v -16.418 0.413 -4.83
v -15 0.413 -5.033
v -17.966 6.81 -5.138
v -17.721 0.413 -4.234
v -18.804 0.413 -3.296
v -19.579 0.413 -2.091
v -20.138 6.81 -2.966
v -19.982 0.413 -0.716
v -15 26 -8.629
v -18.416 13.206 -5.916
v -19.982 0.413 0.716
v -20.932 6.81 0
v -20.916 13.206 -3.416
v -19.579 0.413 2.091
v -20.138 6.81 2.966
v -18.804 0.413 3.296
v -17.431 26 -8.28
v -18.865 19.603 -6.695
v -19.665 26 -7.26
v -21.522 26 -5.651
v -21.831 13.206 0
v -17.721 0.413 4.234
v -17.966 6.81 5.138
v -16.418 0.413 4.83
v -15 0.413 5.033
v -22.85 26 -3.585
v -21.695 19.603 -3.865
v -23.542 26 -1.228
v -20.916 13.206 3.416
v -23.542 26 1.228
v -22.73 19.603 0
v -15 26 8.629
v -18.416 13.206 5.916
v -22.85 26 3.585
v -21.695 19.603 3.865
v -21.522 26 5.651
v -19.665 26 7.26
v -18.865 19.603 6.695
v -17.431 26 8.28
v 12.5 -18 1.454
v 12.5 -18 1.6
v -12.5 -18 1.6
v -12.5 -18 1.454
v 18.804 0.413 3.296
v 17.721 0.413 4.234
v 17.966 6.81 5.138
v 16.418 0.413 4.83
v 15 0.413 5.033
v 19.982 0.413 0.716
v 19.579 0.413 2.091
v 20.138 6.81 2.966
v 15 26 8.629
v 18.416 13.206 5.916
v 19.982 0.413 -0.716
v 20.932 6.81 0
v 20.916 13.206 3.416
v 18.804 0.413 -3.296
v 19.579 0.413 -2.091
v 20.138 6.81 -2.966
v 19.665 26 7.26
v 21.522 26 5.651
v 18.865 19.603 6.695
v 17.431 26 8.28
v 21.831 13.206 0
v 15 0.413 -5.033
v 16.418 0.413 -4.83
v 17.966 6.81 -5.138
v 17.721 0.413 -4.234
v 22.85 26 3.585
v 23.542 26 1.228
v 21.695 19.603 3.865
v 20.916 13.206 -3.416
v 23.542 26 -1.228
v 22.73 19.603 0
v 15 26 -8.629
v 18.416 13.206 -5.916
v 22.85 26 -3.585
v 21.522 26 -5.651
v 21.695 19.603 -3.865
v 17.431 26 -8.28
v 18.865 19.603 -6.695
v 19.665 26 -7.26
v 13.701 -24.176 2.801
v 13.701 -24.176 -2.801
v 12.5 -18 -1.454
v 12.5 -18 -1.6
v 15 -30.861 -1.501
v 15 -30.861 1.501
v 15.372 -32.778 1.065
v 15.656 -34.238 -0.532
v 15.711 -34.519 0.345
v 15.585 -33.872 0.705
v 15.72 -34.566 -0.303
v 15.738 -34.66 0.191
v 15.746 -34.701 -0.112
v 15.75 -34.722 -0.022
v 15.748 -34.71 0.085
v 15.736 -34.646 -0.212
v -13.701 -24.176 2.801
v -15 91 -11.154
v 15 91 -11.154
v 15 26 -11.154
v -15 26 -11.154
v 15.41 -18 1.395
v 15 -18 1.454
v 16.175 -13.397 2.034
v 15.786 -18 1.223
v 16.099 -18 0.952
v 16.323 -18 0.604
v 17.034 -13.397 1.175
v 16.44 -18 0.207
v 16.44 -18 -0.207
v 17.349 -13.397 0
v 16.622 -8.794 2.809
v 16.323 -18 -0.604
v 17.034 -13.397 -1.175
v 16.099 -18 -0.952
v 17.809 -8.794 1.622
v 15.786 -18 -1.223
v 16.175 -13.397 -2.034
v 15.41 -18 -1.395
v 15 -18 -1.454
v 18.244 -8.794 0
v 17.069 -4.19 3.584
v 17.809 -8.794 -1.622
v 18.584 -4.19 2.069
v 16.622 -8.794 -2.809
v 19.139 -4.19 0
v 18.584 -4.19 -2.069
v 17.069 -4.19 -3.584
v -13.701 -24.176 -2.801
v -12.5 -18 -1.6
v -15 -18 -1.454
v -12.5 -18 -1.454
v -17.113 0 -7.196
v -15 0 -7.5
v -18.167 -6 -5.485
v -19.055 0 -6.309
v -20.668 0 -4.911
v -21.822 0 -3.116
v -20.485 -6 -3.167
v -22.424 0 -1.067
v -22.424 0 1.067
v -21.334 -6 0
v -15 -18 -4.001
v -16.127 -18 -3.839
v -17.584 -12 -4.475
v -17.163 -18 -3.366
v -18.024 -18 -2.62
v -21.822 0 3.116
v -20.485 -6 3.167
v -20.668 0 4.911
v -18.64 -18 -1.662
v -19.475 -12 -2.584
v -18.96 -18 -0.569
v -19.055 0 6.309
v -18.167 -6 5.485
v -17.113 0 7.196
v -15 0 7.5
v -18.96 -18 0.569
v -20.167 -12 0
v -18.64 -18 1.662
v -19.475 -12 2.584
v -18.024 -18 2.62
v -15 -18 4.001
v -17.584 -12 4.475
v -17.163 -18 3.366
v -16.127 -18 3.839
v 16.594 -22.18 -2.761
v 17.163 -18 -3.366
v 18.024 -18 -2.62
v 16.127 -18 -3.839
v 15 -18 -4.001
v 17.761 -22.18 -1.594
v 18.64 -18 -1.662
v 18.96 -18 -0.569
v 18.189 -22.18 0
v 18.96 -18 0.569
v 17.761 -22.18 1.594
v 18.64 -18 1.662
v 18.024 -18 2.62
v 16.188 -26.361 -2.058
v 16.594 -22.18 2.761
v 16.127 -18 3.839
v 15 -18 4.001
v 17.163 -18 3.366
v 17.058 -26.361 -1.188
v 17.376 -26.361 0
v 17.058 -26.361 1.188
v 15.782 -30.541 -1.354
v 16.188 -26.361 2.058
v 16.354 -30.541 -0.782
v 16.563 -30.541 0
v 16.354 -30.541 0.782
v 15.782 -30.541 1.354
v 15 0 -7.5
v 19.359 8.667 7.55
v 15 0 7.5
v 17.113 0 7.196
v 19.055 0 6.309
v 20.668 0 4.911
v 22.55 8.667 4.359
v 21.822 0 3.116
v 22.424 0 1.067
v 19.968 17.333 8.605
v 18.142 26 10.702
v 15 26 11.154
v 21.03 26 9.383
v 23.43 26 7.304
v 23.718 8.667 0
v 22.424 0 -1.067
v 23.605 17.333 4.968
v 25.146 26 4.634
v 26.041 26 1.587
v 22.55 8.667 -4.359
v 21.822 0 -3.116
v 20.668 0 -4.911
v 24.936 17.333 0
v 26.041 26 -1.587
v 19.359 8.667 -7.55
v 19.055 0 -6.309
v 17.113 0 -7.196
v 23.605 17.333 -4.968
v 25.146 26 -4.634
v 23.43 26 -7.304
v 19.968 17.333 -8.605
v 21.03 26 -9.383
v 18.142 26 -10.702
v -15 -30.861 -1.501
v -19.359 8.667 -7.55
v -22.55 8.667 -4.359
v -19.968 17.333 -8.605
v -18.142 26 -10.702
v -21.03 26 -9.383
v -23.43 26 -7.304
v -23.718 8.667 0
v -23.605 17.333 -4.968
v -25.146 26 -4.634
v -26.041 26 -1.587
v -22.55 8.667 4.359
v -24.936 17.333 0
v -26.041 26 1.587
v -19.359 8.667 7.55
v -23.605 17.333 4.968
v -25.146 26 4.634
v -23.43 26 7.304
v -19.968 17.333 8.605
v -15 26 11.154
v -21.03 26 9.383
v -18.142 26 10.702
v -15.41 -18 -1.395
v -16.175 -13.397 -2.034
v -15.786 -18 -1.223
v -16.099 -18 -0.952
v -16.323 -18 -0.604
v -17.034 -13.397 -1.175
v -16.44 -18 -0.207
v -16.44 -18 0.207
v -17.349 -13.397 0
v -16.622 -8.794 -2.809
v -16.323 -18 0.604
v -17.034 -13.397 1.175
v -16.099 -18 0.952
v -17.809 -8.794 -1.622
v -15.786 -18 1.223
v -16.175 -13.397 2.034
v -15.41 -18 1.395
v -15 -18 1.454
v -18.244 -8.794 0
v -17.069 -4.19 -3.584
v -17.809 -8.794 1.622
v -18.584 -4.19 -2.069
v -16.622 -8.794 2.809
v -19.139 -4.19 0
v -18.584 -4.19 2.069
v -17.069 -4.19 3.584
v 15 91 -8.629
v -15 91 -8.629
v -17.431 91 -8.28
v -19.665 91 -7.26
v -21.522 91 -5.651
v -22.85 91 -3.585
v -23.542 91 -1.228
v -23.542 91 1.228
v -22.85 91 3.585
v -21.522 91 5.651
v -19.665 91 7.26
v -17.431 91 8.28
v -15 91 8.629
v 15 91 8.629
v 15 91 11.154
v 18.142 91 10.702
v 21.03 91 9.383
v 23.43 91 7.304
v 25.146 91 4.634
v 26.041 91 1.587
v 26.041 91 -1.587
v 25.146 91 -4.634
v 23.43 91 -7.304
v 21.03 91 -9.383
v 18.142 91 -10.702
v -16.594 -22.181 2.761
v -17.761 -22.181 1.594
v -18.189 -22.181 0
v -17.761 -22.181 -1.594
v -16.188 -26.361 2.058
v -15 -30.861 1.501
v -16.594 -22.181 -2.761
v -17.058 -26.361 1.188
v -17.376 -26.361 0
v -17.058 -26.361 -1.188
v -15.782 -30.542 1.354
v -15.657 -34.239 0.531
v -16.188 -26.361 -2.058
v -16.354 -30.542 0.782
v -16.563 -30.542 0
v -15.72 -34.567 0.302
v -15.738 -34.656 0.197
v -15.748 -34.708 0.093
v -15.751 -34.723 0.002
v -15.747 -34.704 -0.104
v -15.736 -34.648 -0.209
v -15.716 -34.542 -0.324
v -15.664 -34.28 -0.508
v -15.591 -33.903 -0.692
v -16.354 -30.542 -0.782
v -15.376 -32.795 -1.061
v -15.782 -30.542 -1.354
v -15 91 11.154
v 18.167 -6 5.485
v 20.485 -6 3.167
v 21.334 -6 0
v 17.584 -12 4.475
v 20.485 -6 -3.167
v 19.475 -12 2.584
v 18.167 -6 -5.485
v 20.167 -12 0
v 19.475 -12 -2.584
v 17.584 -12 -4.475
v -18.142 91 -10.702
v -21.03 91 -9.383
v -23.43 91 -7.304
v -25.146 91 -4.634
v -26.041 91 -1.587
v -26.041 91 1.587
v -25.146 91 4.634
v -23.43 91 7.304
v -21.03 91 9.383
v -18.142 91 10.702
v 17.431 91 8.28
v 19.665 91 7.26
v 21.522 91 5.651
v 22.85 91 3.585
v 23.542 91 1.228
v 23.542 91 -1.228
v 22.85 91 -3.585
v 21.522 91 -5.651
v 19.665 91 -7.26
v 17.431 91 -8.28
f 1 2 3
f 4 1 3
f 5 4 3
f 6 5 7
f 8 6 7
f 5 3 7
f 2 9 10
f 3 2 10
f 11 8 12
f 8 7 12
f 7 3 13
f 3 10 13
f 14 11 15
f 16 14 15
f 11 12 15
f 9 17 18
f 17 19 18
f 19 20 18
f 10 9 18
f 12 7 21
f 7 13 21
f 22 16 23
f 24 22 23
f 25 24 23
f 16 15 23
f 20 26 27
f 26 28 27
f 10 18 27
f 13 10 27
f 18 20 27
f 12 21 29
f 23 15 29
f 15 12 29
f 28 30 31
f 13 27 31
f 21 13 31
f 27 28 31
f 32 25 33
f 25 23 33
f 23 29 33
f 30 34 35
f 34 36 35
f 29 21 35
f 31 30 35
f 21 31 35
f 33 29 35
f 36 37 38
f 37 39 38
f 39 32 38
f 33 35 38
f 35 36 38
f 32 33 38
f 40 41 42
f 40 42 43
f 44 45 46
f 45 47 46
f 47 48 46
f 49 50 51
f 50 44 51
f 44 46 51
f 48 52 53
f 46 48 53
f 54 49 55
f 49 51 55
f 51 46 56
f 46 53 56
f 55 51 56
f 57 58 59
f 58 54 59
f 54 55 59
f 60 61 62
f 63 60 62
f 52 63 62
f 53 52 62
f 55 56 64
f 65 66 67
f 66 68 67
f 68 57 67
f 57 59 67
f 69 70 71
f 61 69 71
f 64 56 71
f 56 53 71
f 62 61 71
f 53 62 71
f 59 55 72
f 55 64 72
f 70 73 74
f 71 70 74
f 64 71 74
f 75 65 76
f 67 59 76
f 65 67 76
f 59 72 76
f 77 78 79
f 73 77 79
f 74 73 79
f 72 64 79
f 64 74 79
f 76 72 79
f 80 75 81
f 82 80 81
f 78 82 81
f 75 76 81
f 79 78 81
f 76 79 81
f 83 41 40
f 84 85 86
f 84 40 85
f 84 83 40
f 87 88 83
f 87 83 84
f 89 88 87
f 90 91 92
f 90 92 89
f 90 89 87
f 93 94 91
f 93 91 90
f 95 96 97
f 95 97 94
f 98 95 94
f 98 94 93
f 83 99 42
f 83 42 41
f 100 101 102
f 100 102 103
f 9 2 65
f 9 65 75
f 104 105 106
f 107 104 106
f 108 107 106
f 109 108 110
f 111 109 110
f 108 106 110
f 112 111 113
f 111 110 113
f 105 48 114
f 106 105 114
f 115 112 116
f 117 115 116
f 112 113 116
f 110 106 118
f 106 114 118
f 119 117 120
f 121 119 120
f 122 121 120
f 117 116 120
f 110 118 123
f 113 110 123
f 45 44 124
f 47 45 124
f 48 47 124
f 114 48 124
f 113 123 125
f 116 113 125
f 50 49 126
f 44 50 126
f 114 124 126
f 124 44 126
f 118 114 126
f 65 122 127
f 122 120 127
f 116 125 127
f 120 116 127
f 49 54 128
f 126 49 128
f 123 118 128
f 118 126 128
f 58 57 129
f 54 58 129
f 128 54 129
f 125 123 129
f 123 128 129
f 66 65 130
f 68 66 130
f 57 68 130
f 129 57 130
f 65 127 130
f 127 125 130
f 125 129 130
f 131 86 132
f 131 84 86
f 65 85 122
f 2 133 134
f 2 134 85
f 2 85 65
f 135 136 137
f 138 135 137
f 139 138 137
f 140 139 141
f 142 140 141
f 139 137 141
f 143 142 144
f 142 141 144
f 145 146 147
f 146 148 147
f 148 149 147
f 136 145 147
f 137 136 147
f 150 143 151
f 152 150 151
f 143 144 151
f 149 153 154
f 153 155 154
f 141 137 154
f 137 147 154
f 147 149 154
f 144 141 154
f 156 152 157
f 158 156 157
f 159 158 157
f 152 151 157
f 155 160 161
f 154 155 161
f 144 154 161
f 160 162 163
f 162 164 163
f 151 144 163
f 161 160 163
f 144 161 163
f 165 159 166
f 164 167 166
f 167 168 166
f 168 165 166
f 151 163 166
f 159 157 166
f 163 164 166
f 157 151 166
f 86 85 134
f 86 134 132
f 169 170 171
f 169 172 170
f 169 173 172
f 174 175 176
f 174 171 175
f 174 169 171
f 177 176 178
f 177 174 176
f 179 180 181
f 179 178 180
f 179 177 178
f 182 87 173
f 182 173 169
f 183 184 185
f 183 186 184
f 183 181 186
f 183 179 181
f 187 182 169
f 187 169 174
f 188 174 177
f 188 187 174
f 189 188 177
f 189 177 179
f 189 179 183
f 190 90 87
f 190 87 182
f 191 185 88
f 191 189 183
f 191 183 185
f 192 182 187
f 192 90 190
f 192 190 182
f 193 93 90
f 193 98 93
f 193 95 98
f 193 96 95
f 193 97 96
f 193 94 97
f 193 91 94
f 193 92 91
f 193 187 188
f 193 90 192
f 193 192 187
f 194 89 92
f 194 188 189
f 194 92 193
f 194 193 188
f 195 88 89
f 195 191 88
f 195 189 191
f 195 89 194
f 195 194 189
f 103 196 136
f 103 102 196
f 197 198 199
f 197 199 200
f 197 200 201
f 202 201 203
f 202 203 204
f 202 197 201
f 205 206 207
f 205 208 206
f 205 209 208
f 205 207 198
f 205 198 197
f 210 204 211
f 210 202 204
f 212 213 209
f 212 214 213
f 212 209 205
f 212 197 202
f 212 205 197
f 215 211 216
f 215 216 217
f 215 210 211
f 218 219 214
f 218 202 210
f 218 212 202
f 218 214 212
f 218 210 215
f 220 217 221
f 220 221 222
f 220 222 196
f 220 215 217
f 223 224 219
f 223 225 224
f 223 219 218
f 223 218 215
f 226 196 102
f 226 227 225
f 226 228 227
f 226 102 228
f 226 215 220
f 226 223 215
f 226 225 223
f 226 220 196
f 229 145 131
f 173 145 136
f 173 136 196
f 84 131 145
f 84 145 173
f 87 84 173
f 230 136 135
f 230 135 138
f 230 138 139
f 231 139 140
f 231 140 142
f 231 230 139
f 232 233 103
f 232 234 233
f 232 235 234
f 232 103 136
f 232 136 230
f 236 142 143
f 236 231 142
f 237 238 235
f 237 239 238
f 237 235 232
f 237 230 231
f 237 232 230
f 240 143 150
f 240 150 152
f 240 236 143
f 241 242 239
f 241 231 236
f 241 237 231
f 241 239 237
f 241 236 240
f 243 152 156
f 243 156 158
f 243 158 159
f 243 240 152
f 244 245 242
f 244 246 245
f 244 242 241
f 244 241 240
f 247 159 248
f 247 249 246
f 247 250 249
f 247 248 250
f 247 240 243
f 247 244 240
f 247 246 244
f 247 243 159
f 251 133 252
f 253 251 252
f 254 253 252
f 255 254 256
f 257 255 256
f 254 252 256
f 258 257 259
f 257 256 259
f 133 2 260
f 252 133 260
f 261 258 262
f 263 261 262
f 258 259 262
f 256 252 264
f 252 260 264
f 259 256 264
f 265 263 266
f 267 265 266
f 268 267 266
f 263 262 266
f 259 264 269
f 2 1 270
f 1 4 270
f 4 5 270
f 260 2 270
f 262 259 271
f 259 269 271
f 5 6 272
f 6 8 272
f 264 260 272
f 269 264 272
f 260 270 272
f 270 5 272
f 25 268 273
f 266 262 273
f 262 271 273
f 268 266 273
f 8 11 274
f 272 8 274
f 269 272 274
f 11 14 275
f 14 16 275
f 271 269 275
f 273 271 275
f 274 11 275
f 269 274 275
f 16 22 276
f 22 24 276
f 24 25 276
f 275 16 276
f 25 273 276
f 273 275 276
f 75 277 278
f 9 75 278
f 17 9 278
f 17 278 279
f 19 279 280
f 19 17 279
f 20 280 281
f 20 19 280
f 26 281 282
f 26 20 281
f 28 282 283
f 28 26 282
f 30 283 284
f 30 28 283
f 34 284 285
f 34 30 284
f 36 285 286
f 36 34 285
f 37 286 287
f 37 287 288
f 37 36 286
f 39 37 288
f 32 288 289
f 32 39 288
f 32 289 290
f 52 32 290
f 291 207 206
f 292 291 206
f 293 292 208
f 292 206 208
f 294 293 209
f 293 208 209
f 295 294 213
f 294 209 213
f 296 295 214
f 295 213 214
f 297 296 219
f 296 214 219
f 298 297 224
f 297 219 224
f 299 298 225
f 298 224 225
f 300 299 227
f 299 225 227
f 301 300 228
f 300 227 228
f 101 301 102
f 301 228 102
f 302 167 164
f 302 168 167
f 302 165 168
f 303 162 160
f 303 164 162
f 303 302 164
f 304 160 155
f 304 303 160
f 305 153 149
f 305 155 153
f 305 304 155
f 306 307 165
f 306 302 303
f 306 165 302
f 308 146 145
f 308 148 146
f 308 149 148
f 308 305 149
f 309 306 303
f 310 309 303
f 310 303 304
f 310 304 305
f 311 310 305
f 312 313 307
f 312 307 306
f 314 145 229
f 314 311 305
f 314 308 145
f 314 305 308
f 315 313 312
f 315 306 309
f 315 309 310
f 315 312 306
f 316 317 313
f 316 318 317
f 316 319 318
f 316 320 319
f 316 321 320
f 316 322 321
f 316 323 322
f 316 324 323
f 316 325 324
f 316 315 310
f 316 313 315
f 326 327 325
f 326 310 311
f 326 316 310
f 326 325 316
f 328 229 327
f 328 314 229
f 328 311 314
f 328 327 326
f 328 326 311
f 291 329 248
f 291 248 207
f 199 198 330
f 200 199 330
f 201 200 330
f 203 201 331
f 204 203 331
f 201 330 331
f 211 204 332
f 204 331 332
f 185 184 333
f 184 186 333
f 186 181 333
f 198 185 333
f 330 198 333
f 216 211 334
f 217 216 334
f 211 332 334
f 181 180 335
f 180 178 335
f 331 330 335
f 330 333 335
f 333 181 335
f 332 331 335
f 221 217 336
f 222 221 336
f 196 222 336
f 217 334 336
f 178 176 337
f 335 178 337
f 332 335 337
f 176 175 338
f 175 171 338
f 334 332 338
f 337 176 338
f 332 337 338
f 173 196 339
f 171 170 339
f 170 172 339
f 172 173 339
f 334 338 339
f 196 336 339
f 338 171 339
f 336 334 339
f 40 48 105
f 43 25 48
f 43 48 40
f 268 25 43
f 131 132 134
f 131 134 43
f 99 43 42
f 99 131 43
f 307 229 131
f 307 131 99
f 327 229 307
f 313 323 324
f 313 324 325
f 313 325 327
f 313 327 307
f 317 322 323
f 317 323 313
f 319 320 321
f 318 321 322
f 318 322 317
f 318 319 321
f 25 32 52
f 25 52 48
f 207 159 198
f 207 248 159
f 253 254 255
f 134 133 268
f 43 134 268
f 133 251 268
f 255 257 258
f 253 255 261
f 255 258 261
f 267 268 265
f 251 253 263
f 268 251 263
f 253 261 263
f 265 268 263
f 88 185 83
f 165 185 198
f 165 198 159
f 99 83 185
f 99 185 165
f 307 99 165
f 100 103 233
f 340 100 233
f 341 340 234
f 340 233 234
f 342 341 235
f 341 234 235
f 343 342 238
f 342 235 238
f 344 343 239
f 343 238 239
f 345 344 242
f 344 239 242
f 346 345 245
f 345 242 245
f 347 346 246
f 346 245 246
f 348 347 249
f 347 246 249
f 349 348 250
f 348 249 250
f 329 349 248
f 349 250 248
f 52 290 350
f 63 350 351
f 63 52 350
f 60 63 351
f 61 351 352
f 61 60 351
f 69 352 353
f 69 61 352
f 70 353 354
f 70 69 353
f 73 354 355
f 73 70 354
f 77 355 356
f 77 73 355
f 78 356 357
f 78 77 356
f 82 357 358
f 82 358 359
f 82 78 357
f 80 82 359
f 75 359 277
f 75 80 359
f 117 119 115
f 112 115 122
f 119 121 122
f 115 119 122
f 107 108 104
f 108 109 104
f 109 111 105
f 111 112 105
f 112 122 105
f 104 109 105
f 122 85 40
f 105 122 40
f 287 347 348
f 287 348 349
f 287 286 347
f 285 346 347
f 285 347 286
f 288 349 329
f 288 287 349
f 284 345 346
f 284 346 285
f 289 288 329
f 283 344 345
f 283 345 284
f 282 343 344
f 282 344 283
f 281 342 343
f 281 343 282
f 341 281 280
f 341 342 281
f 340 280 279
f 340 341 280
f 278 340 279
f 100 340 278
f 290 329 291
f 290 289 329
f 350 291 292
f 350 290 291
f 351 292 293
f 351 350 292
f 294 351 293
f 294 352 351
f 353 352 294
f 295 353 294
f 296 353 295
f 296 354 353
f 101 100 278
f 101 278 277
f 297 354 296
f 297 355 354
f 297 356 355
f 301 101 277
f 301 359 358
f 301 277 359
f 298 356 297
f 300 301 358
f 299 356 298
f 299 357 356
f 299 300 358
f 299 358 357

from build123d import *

# Parameters (mm, degrees)
BOSS_EXTRUDE1_DEPTH           = 18
BOSS_EXTRUDE1_TAPER           = 11
BOSS_EXTRUDE1_OTHER_WAY_DEPTH = 26
BOSS_EXTRUDE1_OTHER_WAY_TAPER = -8
SHELL1_START                  = -15
SHELL1_DEPTH                  = 30
SKETCH2_W                     = 25
SKETCH2_H                     = 3.2
BOSS_EXTRUDE2_DEPTH           = 20
BOSS_EXTRUDE2_TAPER           = 11
BOSS_EXTRUDE3_DEPTH           = 65


with BuildPart() as part:
    # Sketch1 → Boss-Extrude1 (new body)
    with BuildSketch(Plane(origin=(0, 0, 0), x_dir=(1, 0, 0), z_dir=(0, 1, 0))):
        with BuildLine():
            ThreePointArc((-15, 7.5), (-22.5, 0), (-15, -7.5))
            Line((-15, -7.5), (15, -7.5))
            ThreePointArc((15, -7.5), (22.5, 0), (15, 7.5))
            Line((15, 7.5), (-15, 7.5))
        make_face()
    extrude(amount=-BOSS_EXTRUDE1_DEPTH, taper=BOSS_EXTRUDE1_TAPER)

    # Sketch1 → Boss-Extrude1 other way (add)
    with BuildSketch(Plane(origin=(0, 0, 0), x_dir=(1, 0, 0), z_dir=(0, 1, 0))):
        with BuildLine():
            ThreePointArc((-15, 7.5), (-22.5, 0), (-15, -7.5))
            Line((-15, -7.5), (15, -7.5))
            ThreePointArc((15, -7.5), (22.5, 0), (15, 7.5))
            Line((15, 7.5), (-15, 7.5))
        make_face()
    extrude(amount=BOSS_EXTRUDE1_OTHER_WAY_DEPTH, taper=BOSS_EXTRUDE1_OTHER_WAY_TAPER)

    # Shell1: read off the stored shape, not the designer's step
    # Shell1 outline → Shell1 (cut)
    with BuildSketch(Plane.YZ.offset(SHELL1_START)):
        Polygon((26, -8.629492771), (26, 8.629492771), (0.412760457, 5.033440768), (-18, 1.454362698), (-18, -1.454362698), (0.412760457, -5.033440768), align=None)
    extrude(amount=SHELL1_DEPTH, mode=Mode.SUBTRACT)

    # Shell1 2 outline → Shell1 2 (revolve, cut)
    with BuildSketch(Plane(origin=(-15, 0, 0), x_dir=(1, 0, 0), z_dir=(0, 0, 1))):
        Polygon((1.454362698, -18), (5.033440768, 0.412760457), (8.629492771, 26), (0, 26), (0, -18), align=None)
    revolve(axis=Axis((-15, 0, 0), (0, 1, 0)), mode=Mode.SUBTRACT)

    # Shell1 3 outline → Shell1 3 (revolve, cut)
    with BuildSketch(Plane(origin=(15, 0, 0), x_dir=(1, 0, 0), z_dir=(0, 0, 1))):
        Polygon((1.454362698, -18), (5.033440768, 0.412760457), (8.629492771, 26), (0, 26), (0, -18), align=None)
    revolve(axis=Axis((15, 0, 0), (0, 1, 0)), mode=Mode.SUBTRACT)

    # Sketch2 → Boss-Extrude2 (add)
    with BuildSketch(Plane.XZ.offset(18)):
        with BuildLine():
            ThreePointArc((-15, 4.001154436), (-19.001154436, 0), (-15, -4.001154436))
            Line((-15, -4.001154436), (15, -4.001154436))
            ThreePointArc((15, -4.001154436), (19.001154436, 0), (15, 4.001154436))
            Line((15, 4.001154436), (-15, 4.001154436))
        make_face()
        Rectangle(SKETCH2_W, SKETCH2_H, mode=Mode.SUBTRACT)
    extrude(amount=BOSS_EXTRUDE2_DEPTH, taper=BOSS_EXTRUDE2_TAPER)

    # Sketch3 → Boss-Extrude3 (add)
    with BuildSketch(Plane(origin=(0, 26, 0), x_dir=(1, 0, 0), z_dir=(0, 1, 0))):
        with BuildLine():
            Line((-15, -11.154061702), (15, -11.154061702))
            ThreePointArc((15, -11.154061702), (26.154061702, 0), (15, 11.154061702))
            Line((15, 11.154061702), (-15, 11.154061702))
            ThreePointArc((-15, 11.154061702), (-26.154061702, 0), (-15, -11.154061702))
        make_face()
        with BuildLine():
            Line((-15, -8.629492771), (15, -8.629492771))
            ThreePointArc((15, -8.629492771), (23.629492771, 0), (15, 8.629492771))
            Line((15, 8.629492771), (-15, 8.629492771))
            ThreePointArc((-15, 8.629492771), (-23.629492771, 0), (-15, -8.629492771))
        make_face(mode=Mode.SUBTRACT)
    extrude(amount=BOSS_EXTRUDE3_DEPTH)


solid = part.part
